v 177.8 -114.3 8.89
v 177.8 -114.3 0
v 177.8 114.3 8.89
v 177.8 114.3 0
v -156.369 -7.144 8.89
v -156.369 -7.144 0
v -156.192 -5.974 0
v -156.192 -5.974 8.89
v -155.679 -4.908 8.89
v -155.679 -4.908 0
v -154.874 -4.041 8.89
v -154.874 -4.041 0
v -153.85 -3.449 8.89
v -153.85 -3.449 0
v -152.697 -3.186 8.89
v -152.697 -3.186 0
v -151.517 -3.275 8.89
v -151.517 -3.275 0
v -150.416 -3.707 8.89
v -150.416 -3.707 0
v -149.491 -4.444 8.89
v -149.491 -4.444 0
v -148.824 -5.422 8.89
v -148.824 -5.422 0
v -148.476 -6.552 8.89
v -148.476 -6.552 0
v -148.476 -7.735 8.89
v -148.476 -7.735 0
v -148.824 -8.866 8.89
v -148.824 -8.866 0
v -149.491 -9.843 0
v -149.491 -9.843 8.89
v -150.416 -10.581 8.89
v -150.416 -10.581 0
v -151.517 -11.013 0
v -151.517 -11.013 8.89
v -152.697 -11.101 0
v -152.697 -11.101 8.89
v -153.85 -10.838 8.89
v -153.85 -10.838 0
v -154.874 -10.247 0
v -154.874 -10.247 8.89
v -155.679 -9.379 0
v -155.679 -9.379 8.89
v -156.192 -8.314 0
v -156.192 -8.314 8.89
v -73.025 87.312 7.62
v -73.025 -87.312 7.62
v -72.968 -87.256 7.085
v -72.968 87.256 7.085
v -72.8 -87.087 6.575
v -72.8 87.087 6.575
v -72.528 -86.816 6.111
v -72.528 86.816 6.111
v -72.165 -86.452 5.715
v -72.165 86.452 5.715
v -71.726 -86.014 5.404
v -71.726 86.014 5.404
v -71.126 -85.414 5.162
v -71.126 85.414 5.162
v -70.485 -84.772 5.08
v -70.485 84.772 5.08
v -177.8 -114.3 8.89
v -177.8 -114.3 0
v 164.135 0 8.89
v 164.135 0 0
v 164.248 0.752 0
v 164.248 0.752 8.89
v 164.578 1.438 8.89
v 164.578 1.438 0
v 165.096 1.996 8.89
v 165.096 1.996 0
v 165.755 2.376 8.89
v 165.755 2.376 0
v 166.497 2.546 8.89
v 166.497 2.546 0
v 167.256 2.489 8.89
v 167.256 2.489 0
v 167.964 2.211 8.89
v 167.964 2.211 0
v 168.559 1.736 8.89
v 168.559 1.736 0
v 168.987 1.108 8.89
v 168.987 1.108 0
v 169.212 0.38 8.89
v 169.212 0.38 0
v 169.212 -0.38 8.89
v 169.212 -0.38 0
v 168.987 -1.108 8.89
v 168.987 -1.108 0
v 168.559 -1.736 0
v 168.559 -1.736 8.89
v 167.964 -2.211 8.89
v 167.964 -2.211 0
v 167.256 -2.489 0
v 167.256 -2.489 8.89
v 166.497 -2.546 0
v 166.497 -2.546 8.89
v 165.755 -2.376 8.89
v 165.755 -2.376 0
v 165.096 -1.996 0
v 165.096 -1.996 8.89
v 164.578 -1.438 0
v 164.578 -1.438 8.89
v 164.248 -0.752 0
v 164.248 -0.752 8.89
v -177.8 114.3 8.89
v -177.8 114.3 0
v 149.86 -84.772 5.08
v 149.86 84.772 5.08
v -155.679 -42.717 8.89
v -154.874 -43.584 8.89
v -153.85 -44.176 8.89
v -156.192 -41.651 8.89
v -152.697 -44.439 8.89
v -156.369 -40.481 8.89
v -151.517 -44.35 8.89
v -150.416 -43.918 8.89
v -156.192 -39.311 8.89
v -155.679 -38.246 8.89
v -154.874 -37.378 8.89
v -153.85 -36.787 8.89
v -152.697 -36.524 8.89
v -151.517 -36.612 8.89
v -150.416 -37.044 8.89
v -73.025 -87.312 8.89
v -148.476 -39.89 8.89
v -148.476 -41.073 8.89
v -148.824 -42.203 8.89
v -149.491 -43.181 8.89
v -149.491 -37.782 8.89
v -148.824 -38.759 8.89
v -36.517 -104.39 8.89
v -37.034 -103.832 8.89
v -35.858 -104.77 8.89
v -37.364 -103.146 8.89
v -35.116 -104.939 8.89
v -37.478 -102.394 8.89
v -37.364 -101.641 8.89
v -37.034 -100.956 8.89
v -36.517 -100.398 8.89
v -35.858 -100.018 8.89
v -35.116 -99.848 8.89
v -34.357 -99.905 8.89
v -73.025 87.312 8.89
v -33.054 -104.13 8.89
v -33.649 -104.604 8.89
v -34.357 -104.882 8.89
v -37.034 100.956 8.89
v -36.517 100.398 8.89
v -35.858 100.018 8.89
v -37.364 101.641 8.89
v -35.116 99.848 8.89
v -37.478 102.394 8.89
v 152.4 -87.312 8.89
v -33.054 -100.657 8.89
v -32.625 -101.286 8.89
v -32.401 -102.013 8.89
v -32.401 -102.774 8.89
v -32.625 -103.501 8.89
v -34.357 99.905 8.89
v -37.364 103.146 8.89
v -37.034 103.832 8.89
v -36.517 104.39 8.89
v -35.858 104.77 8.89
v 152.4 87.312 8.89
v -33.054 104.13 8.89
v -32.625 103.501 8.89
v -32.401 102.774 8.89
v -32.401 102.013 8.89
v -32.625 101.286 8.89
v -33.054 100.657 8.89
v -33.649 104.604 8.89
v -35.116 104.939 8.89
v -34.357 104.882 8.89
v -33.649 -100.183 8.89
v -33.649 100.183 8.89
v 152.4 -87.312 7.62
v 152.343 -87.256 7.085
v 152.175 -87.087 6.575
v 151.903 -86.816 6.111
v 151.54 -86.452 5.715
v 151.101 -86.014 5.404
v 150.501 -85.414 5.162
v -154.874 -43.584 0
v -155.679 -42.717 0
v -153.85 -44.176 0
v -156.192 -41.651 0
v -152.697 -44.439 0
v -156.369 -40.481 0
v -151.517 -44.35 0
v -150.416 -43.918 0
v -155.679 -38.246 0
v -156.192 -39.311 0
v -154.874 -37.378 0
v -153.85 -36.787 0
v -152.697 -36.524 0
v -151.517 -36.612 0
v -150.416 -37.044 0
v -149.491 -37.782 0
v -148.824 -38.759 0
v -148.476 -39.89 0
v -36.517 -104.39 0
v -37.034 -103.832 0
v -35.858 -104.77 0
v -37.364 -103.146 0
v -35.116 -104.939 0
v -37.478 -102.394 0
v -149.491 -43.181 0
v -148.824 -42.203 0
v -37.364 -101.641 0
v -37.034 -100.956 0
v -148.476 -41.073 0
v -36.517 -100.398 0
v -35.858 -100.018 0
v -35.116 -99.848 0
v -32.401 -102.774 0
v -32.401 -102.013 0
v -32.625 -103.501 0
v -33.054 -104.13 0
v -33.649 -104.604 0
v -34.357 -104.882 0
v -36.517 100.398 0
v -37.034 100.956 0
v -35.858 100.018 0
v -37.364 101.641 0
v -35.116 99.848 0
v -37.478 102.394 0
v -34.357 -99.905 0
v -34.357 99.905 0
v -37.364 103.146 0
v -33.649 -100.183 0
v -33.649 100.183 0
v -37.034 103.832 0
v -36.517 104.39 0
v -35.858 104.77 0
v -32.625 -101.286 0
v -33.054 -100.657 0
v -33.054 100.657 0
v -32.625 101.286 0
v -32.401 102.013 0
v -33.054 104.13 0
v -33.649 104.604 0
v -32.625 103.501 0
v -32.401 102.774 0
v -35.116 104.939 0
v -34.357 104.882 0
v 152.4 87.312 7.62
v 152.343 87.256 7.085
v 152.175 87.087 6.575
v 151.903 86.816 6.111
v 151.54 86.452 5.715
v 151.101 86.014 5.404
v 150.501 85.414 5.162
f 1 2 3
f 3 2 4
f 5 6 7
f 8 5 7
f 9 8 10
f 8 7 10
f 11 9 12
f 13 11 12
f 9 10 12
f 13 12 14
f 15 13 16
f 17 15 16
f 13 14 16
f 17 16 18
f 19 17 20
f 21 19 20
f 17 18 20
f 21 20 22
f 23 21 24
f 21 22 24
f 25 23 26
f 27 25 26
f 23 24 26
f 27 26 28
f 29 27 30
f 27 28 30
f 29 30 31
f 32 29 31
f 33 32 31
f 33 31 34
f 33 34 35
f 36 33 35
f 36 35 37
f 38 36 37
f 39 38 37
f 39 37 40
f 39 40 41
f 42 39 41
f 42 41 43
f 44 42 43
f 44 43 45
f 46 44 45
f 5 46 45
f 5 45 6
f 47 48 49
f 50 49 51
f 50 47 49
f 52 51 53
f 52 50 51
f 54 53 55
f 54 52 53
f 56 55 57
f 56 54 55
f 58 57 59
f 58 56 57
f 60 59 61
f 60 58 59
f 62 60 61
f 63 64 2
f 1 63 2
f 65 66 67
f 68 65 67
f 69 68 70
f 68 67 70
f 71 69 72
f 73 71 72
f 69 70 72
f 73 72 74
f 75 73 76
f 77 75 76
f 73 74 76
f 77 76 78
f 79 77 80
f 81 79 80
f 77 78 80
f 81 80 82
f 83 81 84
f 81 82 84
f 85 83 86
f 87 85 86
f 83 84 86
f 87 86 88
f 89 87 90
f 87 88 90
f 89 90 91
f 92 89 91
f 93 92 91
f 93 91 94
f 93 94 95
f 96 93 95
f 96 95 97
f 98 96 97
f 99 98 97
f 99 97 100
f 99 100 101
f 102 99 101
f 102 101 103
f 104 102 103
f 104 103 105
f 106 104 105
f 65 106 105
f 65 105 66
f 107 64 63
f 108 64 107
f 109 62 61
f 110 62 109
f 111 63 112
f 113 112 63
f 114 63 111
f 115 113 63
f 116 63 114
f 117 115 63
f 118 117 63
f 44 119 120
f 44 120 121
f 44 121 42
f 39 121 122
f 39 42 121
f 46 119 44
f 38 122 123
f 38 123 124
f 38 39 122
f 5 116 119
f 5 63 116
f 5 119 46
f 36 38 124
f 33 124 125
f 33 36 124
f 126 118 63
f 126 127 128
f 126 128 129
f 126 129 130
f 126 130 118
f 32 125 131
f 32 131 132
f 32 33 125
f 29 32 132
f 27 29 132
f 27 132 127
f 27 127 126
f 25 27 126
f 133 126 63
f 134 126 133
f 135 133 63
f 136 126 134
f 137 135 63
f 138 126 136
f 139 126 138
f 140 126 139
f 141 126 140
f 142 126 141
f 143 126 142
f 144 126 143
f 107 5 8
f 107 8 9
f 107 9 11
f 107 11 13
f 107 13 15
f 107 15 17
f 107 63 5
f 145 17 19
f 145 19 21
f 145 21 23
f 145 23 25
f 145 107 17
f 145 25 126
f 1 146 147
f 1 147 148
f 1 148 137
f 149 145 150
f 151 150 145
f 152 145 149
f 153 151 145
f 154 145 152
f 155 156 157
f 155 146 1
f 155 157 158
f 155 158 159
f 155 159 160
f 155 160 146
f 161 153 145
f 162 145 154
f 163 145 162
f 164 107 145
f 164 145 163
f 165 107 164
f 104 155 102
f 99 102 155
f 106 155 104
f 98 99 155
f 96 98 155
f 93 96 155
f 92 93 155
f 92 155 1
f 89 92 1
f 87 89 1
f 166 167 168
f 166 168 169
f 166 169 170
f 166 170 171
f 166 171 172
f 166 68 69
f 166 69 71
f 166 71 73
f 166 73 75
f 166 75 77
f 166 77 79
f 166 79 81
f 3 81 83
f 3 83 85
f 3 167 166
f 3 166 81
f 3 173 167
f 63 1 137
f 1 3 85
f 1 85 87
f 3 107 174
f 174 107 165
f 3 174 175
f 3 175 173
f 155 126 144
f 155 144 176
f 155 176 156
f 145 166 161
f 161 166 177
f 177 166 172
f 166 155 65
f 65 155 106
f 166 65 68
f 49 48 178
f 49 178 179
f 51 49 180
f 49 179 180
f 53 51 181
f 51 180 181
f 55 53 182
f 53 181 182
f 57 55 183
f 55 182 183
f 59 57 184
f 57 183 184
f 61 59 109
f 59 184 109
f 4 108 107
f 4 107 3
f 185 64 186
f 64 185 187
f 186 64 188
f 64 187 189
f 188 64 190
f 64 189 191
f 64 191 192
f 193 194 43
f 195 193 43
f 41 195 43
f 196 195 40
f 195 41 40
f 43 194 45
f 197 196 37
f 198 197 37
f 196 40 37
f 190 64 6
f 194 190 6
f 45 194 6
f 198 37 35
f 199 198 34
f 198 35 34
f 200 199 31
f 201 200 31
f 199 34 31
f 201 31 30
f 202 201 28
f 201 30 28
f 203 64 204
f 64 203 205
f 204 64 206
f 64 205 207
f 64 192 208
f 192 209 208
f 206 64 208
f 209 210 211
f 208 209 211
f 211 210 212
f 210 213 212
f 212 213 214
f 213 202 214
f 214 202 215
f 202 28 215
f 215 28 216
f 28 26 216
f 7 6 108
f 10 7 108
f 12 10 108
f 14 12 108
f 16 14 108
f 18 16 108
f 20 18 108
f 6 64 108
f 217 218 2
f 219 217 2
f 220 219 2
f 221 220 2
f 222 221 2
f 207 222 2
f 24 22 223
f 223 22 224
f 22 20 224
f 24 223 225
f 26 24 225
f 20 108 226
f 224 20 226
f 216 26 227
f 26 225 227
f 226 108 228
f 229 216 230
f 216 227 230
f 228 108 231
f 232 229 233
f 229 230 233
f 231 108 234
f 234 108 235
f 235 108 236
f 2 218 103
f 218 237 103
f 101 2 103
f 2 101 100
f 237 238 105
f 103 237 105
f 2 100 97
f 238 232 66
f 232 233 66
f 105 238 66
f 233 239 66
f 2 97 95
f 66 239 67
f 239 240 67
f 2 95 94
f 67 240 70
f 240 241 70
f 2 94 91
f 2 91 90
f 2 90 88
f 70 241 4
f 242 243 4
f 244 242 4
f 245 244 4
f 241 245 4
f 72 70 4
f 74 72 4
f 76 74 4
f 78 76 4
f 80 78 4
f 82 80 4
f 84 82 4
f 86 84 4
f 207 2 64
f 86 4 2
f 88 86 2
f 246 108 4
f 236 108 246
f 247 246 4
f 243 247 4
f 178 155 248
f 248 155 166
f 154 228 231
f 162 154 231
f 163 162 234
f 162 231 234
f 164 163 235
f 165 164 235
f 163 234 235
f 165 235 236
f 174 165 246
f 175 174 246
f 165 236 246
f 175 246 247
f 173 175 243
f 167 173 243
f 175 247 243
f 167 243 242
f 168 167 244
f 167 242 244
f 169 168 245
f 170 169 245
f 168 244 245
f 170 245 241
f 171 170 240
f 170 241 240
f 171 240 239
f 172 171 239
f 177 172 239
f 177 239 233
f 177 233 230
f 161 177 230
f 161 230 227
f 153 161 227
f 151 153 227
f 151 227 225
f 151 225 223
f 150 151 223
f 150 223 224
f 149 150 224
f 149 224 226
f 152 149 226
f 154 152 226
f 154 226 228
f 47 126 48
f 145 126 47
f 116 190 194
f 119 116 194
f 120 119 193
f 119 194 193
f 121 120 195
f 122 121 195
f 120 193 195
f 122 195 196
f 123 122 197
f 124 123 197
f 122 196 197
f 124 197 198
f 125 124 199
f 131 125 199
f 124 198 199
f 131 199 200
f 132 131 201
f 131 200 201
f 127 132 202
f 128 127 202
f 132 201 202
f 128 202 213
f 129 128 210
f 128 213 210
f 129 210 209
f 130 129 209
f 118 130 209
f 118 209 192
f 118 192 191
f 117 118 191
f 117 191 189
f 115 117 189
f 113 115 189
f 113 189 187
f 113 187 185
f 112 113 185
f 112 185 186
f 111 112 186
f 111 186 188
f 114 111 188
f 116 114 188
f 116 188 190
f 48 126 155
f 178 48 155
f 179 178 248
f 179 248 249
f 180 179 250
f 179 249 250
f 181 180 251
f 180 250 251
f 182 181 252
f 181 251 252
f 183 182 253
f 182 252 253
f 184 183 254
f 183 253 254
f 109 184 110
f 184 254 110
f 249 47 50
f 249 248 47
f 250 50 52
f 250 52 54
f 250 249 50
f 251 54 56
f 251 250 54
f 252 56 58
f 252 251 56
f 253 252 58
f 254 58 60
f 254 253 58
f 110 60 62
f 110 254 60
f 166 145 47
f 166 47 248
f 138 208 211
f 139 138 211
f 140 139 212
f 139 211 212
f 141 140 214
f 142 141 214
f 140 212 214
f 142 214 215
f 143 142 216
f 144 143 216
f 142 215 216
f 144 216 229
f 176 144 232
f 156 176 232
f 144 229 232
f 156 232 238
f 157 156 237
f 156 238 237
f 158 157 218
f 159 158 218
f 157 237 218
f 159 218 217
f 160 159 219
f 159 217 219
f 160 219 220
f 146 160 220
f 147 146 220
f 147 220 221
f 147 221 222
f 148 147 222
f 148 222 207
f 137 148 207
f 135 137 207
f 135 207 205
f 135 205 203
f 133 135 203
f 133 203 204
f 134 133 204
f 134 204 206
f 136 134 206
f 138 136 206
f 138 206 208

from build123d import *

# Parameters (mm, degrees)
F0_W     = 355.6
F0_H     = 228.6
F1_DEPTH = 8.89
F2_W     = 225.425
F2_H     = 174.625
F3_DEPTH = 3.81
F4_R     = 2.54
F6_D     = 5.1054
F8_D     = 7.9375


with BuildPart() as f1:
    # F0 (on Top) → F1 (new body)
    with BuildSketch(Plane.XY):
        Rectangle(F0_W, F0_H)
    extrude(amount=F1_DEPTH)

    # F2 (on face) → F3 (cut)
    with BuildSketch(Plane.XY.offset(8.89)):
        with Locations((39.6875, 0)):
            Rectangle(F2_W, F2_H)
    extrude(amount=-F3_DEPTH, mode=Mode.SUBTRACT)

    # F4
    f4_edges = [f1.edges().sort_by_distance(p)[0] for p in [
        (39.6875, -87.3125, 5.08),
        (152.4, 0, 5.08),
        (39.6875, 87.3125, 5.08),
        (-73.025, 0, 5.08),
    ]]
    fillet(f4_edges, radius=F4_R)

    # F6 (through all)
    with Locations(Plane.XY.offset(8.89)):
        with Locations((-34.925, -102.39375), (-34.925, 102.39375), (166.6875, 0)):
            Hole(F6_D / 2)

    # F8 (through all)
    with Locations(Plane.XY.offset(8.89)):
        with Locations((-152.4, -7.14375), (-152.4, -40.48125)):
            Hole(F8_D / 2)


solid = f1.part
